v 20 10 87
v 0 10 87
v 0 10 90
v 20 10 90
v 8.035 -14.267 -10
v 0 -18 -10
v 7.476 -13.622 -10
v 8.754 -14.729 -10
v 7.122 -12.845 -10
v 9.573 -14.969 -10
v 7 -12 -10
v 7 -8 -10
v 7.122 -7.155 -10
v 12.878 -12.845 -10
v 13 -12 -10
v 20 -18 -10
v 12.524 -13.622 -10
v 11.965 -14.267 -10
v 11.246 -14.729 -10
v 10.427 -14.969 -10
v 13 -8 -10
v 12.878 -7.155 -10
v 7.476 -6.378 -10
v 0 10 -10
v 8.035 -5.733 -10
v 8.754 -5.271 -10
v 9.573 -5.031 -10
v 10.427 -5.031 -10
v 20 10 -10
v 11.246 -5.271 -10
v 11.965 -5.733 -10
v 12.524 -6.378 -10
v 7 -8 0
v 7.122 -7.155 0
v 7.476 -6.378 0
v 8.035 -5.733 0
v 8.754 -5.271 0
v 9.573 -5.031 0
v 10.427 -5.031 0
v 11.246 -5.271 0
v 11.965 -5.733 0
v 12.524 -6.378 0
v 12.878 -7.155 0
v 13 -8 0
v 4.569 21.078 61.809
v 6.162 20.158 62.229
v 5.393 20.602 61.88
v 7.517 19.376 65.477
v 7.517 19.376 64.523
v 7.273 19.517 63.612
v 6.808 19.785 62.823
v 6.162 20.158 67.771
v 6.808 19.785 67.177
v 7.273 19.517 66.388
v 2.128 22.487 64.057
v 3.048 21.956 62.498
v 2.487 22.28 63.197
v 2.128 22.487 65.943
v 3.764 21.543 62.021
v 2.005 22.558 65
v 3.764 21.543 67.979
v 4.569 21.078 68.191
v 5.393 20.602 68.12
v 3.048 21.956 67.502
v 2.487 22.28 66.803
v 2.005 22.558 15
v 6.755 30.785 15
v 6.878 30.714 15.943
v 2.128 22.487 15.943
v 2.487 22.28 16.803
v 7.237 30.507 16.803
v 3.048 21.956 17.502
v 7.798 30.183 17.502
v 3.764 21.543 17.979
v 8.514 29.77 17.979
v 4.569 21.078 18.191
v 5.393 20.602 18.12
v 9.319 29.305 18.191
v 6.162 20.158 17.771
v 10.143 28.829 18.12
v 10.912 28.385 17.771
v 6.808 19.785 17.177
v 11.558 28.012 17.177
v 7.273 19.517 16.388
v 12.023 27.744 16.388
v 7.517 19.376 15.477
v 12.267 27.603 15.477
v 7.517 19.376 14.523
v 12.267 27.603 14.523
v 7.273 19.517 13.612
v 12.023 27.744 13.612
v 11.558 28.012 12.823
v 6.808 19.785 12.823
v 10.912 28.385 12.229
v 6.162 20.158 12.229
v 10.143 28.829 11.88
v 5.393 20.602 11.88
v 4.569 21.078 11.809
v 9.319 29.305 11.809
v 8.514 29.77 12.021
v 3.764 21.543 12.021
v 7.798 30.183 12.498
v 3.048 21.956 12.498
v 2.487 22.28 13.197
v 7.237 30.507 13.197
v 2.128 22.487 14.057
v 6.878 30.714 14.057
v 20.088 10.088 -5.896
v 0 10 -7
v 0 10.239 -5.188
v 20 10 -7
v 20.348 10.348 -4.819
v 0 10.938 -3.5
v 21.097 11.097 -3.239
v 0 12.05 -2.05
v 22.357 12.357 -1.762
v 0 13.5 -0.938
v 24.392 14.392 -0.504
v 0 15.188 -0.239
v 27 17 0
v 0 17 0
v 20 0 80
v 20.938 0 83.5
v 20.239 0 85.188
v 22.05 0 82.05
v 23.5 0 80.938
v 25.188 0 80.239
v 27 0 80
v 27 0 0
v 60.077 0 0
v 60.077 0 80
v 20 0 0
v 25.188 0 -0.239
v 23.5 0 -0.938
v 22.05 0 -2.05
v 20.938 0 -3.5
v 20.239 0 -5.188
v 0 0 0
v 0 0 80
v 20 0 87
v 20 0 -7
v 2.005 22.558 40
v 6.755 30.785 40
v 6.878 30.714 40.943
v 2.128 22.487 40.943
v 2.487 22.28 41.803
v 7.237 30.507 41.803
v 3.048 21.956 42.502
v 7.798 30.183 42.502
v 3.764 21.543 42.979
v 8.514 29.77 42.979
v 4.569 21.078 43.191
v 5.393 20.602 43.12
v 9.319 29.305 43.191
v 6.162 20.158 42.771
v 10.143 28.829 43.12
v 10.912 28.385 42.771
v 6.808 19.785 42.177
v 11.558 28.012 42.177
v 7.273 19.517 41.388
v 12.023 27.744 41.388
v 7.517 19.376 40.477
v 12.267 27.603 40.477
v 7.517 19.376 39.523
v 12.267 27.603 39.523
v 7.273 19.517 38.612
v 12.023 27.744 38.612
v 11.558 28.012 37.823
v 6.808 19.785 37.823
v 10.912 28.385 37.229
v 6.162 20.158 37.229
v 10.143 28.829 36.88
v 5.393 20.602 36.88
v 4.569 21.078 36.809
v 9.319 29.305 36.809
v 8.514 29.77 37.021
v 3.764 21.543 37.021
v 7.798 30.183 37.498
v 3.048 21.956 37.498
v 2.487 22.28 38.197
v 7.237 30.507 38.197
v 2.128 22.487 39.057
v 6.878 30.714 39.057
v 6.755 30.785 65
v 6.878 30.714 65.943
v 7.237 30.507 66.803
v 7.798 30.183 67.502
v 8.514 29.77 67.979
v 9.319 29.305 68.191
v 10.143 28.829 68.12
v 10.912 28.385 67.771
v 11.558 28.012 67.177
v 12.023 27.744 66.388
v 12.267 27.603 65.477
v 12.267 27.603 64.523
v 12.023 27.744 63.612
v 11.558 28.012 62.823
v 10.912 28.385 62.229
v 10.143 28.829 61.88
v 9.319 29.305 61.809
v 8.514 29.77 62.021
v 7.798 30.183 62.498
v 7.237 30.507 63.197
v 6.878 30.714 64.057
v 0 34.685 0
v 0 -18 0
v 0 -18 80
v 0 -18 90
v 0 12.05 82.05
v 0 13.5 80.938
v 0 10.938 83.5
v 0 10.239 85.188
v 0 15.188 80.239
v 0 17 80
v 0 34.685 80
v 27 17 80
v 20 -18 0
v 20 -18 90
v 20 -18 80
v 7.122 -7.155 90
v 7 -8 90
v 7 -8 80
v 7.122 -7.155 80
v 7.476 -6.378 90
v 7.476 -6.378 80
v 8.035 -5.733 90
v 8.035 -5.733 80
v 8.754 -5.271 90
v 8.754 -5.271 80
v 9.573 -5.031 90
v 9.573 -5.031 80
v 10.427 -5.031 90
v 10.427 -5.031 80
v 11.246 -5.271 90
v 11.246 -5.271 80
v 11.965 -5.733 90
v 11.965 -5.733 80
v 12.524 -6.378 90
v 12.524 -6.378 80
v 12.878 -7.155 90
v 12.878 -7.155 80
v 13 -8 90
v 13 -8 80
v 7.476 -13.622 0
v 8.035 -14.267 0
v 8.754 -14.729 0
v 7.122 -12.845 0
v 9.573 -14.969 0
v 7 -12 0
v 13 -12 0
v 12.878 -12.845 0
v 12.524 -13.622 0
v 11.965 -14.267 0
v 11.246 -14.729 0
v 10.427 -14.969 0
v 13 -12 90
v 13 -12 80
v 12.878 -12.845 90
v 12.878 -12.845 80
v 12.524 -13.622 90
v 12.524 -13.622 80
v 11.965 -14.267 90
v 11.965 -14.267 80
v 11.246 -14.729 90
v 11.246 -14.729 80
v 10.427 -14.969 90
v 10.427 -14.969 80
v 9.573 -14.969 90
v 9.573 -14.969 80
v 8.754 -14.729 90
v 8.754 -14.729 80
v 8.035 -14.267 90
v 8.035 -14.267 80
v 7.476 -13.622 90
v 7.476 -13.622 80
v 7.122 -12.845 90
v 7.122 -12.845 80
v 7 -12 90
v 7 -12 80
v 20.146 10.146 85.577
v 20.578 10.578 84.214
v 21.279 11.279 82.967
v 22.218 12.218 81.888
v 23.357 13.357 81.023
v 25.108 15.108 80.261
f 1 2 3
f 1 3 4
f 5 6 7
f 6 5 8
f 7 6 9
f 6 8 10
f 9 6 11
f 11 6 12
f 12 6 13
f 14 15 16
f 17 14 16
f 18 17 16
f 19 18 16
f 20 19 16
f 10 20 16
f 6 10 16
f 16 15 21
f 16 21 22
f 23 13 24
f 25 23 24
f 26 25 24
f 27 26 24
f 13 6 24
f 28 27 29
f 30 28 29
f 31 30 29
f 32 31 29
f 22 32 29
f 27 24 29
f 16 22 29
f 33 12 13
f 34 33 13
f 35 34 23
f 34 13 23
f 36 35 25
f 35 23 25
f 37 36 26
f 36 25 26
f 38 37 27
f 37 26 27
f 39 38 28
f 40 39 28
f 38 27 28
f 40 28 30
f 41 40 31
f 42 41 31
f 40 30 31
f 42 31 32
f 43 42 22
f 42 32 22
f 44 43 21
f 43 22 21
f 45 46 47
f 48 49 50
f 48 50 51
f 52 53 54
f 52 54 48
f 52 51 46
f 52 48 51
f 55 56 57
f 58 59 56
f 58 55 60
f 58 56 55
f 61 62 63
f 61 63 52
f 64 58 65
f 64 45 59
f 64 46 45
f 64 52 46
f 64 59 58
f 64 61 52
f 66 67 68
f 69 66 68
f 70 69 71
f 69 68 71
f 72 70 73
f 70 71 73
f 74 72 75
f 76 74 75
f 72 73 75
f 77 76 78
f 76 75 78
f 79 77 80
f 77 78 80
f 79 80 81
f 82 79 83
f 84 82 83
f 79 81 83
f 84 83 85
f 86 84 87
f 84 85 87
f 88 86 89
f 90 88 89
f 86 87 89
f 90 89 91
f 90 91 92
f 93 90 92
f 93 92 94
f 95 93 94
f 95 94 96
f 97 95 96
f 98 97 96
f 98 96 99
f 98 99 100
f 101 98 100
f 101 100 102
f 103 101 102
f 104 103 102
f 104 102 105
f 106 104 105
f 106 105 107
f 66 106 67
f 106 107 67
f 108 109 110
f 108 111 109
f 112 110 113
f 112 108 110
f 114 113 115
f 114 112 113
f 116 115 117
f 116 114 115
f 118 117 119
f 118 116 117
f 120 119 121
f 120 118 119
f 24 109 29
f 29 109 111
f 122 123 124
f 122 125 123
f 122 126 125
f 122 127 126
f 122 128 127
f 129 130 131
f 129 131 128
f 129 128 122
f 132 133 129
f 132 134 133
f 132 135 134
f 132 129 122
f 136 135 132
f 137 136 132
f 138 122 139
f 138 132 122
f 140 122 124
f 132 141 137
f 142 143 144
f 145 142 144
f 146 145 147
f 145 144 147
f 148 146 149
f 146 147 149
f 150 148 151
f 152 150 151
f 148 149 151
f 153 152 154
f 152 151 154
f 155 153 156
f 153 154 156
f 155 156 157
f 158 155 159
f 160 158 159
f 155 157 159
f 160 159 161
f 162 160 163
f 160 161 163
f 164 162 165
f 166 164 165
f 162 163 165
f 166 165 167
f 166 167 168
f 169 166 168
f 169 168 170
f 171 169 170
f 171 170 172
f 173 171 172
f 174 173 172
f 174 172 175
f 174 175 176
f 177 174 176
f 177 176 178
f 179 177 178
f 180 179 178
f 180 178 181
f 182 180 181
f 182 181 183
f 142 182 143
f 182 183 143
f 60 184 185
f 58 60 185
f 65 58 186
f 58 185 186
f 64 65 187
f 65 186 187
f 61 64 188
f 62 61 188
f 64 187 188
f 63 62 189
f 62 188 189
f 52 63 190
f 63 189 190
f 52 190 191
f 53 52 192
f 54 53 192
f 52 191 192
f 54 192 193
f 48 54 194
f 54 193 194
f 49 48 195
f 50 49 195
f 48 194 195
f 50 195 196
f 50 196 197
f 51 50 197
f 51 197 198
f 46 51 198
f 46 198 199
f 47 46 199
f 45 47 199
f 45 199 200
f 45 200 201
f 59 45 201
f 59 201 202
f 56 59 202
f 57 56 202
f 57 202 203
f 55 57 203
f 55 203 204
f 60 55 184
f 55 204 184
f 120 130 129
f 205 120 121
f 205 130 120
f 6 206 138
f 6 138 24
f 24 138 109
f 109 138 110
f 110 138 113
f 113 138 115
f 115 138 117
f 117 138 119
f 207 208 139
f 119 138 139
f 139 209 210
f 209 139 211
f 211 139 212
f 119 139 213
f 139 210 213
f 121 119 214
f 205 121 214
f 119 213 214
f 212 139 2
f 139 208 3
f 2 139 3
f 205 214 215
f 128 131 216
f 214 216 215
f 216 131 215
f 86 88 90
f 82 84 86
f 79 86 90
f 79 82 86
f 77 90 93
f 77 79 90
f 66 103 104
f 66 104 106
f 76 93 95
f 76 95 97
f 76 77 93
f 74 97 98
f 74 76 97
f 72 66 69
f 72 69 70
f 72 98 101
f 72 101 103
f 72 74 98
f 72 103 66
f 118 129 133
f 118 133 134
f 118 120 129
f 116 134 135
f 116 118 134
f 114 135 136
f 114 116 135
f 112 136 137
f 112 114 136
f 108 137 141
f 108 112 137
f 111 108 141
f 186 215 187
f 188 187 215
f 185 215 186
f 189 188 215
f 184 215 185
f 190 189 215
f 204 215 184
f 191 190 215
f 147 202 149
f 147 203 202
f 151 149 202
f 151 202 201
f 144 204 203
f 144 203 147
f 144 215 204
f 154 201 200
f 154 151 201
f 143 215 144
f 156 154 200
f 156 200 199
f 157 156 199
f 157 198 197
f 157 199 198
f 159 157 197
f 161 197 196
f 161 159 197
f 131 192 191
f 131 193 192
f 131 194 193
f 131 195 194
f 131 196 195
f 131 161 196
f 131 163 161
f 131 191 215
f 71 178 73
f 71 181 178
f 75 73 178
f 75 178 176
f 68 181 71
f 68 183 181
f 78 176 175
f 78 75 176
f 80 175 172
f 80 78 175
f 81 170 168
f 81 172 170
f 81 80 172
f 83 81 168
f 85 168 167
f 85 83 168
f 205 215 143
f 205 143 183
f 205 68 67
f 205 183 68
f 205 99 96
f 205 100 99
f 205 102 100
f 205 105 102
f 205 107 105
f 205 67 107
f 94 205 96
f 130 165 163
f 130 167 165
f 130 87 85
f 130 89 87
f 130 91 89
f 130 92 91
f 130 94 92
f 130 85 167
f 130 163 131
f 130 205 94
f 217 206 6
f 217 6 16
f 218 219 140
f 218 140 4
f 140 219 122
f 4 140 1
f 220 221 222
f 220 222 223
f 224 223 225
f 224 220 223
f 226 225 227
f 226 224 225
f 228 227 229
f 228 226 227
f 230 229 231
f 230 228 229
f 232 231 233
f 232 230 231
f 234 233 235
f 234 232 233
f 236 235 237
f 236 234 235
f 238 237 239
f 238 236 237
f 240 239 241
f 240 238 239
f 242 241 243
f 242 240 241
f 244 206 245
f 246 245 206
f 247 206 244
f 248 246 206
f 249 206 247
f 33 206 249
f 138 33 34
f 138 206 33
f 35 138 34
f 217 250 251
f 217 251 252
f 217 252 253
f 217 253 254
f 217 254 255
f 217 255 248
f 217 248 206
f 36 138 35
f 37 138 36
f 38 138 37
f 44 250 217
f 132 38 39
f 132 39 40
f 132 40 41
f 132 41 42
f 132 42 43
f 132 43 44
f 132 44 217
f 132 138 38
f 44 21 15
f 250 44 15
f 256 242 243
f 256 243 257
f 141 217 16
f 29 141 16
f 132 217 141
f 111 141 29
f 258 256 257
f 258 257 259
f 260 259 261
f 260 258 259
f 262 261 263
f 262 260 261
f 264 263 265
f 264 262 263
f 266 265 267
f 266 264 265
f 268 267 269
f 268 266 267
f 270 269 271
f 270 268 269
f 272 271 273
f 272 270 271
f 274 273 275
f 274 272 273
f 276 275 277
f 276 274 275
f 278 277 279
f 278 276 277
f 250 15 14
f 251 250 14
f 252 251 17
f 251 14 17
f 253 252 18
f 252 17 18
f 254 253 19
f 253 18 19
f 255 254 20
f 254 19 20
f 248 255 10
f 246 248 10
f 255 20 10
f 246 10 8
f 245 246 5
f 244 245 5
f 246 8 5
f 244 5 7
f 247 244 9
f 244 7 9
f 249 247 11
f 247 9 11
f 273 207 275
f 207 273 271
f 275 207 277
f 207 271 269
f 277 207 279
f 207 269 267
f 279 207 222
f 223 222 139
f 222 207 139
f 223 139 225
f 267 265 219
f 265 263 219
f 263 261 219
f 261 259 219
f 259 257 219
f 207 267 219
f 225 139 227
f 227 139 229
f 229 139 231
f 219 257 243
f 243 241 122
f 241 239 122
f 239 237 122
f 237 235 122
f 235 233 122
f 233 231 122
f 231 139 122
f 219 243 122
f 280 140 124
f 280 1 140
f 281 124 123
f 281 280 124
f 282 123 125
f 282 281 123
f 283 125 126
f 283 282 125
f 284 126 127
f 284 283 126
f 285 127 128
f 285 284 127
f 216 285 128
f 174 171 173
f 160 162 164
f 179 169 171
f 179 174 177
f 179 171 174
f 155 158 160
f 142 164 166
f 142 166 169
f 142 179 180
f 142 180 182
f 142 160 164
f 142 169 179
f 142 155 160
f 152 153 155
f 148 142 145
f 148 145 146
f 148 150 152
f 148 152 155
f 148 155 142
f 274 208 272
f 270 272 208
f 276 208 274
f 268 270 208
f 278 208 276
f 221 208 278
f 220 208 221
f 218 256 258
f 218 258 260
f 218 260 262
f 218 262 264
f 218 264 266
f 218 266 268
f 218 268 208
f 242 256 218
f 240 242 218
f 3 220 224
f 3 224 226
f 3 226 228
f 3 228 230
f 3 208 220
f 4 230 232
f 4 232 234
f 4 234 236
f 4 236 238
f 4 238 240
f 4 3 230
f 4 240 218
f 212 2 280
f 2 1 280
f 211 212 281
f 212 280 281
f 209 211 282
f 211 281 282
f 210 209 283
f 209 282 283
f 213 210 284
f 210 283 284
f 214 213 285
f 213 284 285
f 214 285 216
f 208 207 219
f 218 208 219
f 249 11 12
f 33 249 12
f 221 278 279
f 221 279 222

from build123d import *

# Parameters (mm, degrees)
BOSS_EXTRUDE1_DEPTH = 80
SKETCH2_W           = 20
SKETCH2_H           = 28
BOSS_EXTRUDE2_DEPTH = 10
FILLET1_R           = 7
CUT_EXTRUDE1_DEPTH  = 20
FILLET2_R           = 7
SKETCH4_R           = 3.2
CUT_EXTRUDE2_DEPTH  = 9.5


with BuildPart() as part:
    # Sketch1 → Boss-Extrude1 (new body)
    with BuildSketch(Plane.XY):
        Polygon((0, 0), (0, 34.685337878), (60.076767483, 0), align=None)
    extrude(amount=BOSS_EXTRUDE1_DEPTH)

    # Sketch2 → Boss-Extrude2 (add)
    with BuildSketch(Plane.XY.offset(80)):
        with Locations((10, -4)):
            Rectangle(SKETCH2_W, SKETCH2_H)
    boss_extrude2 = extrude(amount=BOSS_EXTRUDE2_DEPTH)

    # Fillet1
    fillet1_edges = [part.edges().sort_by_distance(p)[0] for p in [
        (20, 5, 80),
        (10, 10, 80),
    ]]
    fillet(fillet1_edges, radius=FILLET1_R)

    # Sketch3 → Cut-Extrude1 (cut)
    with BuildSketch(Plane.XY.offset(90)):
        with BuildLine():
            Line((7, -12), (7, -8))
            ThreePointArc((7, -8), (10, -5), (13, -8))
            Line((13, -8), (13, -12))
            ThreePointArc((13, -12), (10, -15), (7, -12))
        make_face()
    cut_extrude1 = extrude(amount=-CUT_EXTRUDE1_DEPTH, mode=Mode.SUBTRACT)

    # Mirror10: Boss-Extrude2, Cut-Extrude1 across plane
    add(boss_extrude2.mirror(Plane(origin=(0, 0, 40), x_dir=(1, 0, 0), z_dir=(0, 0, -1))))
    add(cut_extrude1.mirror(Plane(origin=(0, 0, 40), x_dir=(1, 0, 0), z_dir=(0, 0, -1))), mode=Mode.SUBTRACT)

    # Fillet2
    fillet2_edges = [part.edges().sort_by_distance(p)[0] for p in [
        (20, 5, 0),
        (10, 10, 0),
    ]]
    fillet(fillet2_edges, radius=FILLET2_R)

    # Sketch4 → Cut-Extrude2 (cut)
    with BuildSketch(Plane(origin=(15.019191871, 26.014003409, 0), x_dir=(0.8660254037844418, -0.49999999999999456, 0), z_dir=(0.4999999999999946, 0.8660254037844419, 0))):
        with Locations(Location((-6.342668939, -15, 0), (0, 0, 180))):
            Circle(SKETCH4_R)
        with Locations(Location((-6.342668939, -40, 0), (0, 0, 180))):
            Circle(SKETCH4_R)
        with Locations(Location((-6.342668939, -65, 0), (0, 0, 180))):
            Circle(SKETCH4_R)
    extrude(amount=-CUT_EXTRUDE2_DEPTH, mode=Mode.SUBTRACT)


solid = part.part
